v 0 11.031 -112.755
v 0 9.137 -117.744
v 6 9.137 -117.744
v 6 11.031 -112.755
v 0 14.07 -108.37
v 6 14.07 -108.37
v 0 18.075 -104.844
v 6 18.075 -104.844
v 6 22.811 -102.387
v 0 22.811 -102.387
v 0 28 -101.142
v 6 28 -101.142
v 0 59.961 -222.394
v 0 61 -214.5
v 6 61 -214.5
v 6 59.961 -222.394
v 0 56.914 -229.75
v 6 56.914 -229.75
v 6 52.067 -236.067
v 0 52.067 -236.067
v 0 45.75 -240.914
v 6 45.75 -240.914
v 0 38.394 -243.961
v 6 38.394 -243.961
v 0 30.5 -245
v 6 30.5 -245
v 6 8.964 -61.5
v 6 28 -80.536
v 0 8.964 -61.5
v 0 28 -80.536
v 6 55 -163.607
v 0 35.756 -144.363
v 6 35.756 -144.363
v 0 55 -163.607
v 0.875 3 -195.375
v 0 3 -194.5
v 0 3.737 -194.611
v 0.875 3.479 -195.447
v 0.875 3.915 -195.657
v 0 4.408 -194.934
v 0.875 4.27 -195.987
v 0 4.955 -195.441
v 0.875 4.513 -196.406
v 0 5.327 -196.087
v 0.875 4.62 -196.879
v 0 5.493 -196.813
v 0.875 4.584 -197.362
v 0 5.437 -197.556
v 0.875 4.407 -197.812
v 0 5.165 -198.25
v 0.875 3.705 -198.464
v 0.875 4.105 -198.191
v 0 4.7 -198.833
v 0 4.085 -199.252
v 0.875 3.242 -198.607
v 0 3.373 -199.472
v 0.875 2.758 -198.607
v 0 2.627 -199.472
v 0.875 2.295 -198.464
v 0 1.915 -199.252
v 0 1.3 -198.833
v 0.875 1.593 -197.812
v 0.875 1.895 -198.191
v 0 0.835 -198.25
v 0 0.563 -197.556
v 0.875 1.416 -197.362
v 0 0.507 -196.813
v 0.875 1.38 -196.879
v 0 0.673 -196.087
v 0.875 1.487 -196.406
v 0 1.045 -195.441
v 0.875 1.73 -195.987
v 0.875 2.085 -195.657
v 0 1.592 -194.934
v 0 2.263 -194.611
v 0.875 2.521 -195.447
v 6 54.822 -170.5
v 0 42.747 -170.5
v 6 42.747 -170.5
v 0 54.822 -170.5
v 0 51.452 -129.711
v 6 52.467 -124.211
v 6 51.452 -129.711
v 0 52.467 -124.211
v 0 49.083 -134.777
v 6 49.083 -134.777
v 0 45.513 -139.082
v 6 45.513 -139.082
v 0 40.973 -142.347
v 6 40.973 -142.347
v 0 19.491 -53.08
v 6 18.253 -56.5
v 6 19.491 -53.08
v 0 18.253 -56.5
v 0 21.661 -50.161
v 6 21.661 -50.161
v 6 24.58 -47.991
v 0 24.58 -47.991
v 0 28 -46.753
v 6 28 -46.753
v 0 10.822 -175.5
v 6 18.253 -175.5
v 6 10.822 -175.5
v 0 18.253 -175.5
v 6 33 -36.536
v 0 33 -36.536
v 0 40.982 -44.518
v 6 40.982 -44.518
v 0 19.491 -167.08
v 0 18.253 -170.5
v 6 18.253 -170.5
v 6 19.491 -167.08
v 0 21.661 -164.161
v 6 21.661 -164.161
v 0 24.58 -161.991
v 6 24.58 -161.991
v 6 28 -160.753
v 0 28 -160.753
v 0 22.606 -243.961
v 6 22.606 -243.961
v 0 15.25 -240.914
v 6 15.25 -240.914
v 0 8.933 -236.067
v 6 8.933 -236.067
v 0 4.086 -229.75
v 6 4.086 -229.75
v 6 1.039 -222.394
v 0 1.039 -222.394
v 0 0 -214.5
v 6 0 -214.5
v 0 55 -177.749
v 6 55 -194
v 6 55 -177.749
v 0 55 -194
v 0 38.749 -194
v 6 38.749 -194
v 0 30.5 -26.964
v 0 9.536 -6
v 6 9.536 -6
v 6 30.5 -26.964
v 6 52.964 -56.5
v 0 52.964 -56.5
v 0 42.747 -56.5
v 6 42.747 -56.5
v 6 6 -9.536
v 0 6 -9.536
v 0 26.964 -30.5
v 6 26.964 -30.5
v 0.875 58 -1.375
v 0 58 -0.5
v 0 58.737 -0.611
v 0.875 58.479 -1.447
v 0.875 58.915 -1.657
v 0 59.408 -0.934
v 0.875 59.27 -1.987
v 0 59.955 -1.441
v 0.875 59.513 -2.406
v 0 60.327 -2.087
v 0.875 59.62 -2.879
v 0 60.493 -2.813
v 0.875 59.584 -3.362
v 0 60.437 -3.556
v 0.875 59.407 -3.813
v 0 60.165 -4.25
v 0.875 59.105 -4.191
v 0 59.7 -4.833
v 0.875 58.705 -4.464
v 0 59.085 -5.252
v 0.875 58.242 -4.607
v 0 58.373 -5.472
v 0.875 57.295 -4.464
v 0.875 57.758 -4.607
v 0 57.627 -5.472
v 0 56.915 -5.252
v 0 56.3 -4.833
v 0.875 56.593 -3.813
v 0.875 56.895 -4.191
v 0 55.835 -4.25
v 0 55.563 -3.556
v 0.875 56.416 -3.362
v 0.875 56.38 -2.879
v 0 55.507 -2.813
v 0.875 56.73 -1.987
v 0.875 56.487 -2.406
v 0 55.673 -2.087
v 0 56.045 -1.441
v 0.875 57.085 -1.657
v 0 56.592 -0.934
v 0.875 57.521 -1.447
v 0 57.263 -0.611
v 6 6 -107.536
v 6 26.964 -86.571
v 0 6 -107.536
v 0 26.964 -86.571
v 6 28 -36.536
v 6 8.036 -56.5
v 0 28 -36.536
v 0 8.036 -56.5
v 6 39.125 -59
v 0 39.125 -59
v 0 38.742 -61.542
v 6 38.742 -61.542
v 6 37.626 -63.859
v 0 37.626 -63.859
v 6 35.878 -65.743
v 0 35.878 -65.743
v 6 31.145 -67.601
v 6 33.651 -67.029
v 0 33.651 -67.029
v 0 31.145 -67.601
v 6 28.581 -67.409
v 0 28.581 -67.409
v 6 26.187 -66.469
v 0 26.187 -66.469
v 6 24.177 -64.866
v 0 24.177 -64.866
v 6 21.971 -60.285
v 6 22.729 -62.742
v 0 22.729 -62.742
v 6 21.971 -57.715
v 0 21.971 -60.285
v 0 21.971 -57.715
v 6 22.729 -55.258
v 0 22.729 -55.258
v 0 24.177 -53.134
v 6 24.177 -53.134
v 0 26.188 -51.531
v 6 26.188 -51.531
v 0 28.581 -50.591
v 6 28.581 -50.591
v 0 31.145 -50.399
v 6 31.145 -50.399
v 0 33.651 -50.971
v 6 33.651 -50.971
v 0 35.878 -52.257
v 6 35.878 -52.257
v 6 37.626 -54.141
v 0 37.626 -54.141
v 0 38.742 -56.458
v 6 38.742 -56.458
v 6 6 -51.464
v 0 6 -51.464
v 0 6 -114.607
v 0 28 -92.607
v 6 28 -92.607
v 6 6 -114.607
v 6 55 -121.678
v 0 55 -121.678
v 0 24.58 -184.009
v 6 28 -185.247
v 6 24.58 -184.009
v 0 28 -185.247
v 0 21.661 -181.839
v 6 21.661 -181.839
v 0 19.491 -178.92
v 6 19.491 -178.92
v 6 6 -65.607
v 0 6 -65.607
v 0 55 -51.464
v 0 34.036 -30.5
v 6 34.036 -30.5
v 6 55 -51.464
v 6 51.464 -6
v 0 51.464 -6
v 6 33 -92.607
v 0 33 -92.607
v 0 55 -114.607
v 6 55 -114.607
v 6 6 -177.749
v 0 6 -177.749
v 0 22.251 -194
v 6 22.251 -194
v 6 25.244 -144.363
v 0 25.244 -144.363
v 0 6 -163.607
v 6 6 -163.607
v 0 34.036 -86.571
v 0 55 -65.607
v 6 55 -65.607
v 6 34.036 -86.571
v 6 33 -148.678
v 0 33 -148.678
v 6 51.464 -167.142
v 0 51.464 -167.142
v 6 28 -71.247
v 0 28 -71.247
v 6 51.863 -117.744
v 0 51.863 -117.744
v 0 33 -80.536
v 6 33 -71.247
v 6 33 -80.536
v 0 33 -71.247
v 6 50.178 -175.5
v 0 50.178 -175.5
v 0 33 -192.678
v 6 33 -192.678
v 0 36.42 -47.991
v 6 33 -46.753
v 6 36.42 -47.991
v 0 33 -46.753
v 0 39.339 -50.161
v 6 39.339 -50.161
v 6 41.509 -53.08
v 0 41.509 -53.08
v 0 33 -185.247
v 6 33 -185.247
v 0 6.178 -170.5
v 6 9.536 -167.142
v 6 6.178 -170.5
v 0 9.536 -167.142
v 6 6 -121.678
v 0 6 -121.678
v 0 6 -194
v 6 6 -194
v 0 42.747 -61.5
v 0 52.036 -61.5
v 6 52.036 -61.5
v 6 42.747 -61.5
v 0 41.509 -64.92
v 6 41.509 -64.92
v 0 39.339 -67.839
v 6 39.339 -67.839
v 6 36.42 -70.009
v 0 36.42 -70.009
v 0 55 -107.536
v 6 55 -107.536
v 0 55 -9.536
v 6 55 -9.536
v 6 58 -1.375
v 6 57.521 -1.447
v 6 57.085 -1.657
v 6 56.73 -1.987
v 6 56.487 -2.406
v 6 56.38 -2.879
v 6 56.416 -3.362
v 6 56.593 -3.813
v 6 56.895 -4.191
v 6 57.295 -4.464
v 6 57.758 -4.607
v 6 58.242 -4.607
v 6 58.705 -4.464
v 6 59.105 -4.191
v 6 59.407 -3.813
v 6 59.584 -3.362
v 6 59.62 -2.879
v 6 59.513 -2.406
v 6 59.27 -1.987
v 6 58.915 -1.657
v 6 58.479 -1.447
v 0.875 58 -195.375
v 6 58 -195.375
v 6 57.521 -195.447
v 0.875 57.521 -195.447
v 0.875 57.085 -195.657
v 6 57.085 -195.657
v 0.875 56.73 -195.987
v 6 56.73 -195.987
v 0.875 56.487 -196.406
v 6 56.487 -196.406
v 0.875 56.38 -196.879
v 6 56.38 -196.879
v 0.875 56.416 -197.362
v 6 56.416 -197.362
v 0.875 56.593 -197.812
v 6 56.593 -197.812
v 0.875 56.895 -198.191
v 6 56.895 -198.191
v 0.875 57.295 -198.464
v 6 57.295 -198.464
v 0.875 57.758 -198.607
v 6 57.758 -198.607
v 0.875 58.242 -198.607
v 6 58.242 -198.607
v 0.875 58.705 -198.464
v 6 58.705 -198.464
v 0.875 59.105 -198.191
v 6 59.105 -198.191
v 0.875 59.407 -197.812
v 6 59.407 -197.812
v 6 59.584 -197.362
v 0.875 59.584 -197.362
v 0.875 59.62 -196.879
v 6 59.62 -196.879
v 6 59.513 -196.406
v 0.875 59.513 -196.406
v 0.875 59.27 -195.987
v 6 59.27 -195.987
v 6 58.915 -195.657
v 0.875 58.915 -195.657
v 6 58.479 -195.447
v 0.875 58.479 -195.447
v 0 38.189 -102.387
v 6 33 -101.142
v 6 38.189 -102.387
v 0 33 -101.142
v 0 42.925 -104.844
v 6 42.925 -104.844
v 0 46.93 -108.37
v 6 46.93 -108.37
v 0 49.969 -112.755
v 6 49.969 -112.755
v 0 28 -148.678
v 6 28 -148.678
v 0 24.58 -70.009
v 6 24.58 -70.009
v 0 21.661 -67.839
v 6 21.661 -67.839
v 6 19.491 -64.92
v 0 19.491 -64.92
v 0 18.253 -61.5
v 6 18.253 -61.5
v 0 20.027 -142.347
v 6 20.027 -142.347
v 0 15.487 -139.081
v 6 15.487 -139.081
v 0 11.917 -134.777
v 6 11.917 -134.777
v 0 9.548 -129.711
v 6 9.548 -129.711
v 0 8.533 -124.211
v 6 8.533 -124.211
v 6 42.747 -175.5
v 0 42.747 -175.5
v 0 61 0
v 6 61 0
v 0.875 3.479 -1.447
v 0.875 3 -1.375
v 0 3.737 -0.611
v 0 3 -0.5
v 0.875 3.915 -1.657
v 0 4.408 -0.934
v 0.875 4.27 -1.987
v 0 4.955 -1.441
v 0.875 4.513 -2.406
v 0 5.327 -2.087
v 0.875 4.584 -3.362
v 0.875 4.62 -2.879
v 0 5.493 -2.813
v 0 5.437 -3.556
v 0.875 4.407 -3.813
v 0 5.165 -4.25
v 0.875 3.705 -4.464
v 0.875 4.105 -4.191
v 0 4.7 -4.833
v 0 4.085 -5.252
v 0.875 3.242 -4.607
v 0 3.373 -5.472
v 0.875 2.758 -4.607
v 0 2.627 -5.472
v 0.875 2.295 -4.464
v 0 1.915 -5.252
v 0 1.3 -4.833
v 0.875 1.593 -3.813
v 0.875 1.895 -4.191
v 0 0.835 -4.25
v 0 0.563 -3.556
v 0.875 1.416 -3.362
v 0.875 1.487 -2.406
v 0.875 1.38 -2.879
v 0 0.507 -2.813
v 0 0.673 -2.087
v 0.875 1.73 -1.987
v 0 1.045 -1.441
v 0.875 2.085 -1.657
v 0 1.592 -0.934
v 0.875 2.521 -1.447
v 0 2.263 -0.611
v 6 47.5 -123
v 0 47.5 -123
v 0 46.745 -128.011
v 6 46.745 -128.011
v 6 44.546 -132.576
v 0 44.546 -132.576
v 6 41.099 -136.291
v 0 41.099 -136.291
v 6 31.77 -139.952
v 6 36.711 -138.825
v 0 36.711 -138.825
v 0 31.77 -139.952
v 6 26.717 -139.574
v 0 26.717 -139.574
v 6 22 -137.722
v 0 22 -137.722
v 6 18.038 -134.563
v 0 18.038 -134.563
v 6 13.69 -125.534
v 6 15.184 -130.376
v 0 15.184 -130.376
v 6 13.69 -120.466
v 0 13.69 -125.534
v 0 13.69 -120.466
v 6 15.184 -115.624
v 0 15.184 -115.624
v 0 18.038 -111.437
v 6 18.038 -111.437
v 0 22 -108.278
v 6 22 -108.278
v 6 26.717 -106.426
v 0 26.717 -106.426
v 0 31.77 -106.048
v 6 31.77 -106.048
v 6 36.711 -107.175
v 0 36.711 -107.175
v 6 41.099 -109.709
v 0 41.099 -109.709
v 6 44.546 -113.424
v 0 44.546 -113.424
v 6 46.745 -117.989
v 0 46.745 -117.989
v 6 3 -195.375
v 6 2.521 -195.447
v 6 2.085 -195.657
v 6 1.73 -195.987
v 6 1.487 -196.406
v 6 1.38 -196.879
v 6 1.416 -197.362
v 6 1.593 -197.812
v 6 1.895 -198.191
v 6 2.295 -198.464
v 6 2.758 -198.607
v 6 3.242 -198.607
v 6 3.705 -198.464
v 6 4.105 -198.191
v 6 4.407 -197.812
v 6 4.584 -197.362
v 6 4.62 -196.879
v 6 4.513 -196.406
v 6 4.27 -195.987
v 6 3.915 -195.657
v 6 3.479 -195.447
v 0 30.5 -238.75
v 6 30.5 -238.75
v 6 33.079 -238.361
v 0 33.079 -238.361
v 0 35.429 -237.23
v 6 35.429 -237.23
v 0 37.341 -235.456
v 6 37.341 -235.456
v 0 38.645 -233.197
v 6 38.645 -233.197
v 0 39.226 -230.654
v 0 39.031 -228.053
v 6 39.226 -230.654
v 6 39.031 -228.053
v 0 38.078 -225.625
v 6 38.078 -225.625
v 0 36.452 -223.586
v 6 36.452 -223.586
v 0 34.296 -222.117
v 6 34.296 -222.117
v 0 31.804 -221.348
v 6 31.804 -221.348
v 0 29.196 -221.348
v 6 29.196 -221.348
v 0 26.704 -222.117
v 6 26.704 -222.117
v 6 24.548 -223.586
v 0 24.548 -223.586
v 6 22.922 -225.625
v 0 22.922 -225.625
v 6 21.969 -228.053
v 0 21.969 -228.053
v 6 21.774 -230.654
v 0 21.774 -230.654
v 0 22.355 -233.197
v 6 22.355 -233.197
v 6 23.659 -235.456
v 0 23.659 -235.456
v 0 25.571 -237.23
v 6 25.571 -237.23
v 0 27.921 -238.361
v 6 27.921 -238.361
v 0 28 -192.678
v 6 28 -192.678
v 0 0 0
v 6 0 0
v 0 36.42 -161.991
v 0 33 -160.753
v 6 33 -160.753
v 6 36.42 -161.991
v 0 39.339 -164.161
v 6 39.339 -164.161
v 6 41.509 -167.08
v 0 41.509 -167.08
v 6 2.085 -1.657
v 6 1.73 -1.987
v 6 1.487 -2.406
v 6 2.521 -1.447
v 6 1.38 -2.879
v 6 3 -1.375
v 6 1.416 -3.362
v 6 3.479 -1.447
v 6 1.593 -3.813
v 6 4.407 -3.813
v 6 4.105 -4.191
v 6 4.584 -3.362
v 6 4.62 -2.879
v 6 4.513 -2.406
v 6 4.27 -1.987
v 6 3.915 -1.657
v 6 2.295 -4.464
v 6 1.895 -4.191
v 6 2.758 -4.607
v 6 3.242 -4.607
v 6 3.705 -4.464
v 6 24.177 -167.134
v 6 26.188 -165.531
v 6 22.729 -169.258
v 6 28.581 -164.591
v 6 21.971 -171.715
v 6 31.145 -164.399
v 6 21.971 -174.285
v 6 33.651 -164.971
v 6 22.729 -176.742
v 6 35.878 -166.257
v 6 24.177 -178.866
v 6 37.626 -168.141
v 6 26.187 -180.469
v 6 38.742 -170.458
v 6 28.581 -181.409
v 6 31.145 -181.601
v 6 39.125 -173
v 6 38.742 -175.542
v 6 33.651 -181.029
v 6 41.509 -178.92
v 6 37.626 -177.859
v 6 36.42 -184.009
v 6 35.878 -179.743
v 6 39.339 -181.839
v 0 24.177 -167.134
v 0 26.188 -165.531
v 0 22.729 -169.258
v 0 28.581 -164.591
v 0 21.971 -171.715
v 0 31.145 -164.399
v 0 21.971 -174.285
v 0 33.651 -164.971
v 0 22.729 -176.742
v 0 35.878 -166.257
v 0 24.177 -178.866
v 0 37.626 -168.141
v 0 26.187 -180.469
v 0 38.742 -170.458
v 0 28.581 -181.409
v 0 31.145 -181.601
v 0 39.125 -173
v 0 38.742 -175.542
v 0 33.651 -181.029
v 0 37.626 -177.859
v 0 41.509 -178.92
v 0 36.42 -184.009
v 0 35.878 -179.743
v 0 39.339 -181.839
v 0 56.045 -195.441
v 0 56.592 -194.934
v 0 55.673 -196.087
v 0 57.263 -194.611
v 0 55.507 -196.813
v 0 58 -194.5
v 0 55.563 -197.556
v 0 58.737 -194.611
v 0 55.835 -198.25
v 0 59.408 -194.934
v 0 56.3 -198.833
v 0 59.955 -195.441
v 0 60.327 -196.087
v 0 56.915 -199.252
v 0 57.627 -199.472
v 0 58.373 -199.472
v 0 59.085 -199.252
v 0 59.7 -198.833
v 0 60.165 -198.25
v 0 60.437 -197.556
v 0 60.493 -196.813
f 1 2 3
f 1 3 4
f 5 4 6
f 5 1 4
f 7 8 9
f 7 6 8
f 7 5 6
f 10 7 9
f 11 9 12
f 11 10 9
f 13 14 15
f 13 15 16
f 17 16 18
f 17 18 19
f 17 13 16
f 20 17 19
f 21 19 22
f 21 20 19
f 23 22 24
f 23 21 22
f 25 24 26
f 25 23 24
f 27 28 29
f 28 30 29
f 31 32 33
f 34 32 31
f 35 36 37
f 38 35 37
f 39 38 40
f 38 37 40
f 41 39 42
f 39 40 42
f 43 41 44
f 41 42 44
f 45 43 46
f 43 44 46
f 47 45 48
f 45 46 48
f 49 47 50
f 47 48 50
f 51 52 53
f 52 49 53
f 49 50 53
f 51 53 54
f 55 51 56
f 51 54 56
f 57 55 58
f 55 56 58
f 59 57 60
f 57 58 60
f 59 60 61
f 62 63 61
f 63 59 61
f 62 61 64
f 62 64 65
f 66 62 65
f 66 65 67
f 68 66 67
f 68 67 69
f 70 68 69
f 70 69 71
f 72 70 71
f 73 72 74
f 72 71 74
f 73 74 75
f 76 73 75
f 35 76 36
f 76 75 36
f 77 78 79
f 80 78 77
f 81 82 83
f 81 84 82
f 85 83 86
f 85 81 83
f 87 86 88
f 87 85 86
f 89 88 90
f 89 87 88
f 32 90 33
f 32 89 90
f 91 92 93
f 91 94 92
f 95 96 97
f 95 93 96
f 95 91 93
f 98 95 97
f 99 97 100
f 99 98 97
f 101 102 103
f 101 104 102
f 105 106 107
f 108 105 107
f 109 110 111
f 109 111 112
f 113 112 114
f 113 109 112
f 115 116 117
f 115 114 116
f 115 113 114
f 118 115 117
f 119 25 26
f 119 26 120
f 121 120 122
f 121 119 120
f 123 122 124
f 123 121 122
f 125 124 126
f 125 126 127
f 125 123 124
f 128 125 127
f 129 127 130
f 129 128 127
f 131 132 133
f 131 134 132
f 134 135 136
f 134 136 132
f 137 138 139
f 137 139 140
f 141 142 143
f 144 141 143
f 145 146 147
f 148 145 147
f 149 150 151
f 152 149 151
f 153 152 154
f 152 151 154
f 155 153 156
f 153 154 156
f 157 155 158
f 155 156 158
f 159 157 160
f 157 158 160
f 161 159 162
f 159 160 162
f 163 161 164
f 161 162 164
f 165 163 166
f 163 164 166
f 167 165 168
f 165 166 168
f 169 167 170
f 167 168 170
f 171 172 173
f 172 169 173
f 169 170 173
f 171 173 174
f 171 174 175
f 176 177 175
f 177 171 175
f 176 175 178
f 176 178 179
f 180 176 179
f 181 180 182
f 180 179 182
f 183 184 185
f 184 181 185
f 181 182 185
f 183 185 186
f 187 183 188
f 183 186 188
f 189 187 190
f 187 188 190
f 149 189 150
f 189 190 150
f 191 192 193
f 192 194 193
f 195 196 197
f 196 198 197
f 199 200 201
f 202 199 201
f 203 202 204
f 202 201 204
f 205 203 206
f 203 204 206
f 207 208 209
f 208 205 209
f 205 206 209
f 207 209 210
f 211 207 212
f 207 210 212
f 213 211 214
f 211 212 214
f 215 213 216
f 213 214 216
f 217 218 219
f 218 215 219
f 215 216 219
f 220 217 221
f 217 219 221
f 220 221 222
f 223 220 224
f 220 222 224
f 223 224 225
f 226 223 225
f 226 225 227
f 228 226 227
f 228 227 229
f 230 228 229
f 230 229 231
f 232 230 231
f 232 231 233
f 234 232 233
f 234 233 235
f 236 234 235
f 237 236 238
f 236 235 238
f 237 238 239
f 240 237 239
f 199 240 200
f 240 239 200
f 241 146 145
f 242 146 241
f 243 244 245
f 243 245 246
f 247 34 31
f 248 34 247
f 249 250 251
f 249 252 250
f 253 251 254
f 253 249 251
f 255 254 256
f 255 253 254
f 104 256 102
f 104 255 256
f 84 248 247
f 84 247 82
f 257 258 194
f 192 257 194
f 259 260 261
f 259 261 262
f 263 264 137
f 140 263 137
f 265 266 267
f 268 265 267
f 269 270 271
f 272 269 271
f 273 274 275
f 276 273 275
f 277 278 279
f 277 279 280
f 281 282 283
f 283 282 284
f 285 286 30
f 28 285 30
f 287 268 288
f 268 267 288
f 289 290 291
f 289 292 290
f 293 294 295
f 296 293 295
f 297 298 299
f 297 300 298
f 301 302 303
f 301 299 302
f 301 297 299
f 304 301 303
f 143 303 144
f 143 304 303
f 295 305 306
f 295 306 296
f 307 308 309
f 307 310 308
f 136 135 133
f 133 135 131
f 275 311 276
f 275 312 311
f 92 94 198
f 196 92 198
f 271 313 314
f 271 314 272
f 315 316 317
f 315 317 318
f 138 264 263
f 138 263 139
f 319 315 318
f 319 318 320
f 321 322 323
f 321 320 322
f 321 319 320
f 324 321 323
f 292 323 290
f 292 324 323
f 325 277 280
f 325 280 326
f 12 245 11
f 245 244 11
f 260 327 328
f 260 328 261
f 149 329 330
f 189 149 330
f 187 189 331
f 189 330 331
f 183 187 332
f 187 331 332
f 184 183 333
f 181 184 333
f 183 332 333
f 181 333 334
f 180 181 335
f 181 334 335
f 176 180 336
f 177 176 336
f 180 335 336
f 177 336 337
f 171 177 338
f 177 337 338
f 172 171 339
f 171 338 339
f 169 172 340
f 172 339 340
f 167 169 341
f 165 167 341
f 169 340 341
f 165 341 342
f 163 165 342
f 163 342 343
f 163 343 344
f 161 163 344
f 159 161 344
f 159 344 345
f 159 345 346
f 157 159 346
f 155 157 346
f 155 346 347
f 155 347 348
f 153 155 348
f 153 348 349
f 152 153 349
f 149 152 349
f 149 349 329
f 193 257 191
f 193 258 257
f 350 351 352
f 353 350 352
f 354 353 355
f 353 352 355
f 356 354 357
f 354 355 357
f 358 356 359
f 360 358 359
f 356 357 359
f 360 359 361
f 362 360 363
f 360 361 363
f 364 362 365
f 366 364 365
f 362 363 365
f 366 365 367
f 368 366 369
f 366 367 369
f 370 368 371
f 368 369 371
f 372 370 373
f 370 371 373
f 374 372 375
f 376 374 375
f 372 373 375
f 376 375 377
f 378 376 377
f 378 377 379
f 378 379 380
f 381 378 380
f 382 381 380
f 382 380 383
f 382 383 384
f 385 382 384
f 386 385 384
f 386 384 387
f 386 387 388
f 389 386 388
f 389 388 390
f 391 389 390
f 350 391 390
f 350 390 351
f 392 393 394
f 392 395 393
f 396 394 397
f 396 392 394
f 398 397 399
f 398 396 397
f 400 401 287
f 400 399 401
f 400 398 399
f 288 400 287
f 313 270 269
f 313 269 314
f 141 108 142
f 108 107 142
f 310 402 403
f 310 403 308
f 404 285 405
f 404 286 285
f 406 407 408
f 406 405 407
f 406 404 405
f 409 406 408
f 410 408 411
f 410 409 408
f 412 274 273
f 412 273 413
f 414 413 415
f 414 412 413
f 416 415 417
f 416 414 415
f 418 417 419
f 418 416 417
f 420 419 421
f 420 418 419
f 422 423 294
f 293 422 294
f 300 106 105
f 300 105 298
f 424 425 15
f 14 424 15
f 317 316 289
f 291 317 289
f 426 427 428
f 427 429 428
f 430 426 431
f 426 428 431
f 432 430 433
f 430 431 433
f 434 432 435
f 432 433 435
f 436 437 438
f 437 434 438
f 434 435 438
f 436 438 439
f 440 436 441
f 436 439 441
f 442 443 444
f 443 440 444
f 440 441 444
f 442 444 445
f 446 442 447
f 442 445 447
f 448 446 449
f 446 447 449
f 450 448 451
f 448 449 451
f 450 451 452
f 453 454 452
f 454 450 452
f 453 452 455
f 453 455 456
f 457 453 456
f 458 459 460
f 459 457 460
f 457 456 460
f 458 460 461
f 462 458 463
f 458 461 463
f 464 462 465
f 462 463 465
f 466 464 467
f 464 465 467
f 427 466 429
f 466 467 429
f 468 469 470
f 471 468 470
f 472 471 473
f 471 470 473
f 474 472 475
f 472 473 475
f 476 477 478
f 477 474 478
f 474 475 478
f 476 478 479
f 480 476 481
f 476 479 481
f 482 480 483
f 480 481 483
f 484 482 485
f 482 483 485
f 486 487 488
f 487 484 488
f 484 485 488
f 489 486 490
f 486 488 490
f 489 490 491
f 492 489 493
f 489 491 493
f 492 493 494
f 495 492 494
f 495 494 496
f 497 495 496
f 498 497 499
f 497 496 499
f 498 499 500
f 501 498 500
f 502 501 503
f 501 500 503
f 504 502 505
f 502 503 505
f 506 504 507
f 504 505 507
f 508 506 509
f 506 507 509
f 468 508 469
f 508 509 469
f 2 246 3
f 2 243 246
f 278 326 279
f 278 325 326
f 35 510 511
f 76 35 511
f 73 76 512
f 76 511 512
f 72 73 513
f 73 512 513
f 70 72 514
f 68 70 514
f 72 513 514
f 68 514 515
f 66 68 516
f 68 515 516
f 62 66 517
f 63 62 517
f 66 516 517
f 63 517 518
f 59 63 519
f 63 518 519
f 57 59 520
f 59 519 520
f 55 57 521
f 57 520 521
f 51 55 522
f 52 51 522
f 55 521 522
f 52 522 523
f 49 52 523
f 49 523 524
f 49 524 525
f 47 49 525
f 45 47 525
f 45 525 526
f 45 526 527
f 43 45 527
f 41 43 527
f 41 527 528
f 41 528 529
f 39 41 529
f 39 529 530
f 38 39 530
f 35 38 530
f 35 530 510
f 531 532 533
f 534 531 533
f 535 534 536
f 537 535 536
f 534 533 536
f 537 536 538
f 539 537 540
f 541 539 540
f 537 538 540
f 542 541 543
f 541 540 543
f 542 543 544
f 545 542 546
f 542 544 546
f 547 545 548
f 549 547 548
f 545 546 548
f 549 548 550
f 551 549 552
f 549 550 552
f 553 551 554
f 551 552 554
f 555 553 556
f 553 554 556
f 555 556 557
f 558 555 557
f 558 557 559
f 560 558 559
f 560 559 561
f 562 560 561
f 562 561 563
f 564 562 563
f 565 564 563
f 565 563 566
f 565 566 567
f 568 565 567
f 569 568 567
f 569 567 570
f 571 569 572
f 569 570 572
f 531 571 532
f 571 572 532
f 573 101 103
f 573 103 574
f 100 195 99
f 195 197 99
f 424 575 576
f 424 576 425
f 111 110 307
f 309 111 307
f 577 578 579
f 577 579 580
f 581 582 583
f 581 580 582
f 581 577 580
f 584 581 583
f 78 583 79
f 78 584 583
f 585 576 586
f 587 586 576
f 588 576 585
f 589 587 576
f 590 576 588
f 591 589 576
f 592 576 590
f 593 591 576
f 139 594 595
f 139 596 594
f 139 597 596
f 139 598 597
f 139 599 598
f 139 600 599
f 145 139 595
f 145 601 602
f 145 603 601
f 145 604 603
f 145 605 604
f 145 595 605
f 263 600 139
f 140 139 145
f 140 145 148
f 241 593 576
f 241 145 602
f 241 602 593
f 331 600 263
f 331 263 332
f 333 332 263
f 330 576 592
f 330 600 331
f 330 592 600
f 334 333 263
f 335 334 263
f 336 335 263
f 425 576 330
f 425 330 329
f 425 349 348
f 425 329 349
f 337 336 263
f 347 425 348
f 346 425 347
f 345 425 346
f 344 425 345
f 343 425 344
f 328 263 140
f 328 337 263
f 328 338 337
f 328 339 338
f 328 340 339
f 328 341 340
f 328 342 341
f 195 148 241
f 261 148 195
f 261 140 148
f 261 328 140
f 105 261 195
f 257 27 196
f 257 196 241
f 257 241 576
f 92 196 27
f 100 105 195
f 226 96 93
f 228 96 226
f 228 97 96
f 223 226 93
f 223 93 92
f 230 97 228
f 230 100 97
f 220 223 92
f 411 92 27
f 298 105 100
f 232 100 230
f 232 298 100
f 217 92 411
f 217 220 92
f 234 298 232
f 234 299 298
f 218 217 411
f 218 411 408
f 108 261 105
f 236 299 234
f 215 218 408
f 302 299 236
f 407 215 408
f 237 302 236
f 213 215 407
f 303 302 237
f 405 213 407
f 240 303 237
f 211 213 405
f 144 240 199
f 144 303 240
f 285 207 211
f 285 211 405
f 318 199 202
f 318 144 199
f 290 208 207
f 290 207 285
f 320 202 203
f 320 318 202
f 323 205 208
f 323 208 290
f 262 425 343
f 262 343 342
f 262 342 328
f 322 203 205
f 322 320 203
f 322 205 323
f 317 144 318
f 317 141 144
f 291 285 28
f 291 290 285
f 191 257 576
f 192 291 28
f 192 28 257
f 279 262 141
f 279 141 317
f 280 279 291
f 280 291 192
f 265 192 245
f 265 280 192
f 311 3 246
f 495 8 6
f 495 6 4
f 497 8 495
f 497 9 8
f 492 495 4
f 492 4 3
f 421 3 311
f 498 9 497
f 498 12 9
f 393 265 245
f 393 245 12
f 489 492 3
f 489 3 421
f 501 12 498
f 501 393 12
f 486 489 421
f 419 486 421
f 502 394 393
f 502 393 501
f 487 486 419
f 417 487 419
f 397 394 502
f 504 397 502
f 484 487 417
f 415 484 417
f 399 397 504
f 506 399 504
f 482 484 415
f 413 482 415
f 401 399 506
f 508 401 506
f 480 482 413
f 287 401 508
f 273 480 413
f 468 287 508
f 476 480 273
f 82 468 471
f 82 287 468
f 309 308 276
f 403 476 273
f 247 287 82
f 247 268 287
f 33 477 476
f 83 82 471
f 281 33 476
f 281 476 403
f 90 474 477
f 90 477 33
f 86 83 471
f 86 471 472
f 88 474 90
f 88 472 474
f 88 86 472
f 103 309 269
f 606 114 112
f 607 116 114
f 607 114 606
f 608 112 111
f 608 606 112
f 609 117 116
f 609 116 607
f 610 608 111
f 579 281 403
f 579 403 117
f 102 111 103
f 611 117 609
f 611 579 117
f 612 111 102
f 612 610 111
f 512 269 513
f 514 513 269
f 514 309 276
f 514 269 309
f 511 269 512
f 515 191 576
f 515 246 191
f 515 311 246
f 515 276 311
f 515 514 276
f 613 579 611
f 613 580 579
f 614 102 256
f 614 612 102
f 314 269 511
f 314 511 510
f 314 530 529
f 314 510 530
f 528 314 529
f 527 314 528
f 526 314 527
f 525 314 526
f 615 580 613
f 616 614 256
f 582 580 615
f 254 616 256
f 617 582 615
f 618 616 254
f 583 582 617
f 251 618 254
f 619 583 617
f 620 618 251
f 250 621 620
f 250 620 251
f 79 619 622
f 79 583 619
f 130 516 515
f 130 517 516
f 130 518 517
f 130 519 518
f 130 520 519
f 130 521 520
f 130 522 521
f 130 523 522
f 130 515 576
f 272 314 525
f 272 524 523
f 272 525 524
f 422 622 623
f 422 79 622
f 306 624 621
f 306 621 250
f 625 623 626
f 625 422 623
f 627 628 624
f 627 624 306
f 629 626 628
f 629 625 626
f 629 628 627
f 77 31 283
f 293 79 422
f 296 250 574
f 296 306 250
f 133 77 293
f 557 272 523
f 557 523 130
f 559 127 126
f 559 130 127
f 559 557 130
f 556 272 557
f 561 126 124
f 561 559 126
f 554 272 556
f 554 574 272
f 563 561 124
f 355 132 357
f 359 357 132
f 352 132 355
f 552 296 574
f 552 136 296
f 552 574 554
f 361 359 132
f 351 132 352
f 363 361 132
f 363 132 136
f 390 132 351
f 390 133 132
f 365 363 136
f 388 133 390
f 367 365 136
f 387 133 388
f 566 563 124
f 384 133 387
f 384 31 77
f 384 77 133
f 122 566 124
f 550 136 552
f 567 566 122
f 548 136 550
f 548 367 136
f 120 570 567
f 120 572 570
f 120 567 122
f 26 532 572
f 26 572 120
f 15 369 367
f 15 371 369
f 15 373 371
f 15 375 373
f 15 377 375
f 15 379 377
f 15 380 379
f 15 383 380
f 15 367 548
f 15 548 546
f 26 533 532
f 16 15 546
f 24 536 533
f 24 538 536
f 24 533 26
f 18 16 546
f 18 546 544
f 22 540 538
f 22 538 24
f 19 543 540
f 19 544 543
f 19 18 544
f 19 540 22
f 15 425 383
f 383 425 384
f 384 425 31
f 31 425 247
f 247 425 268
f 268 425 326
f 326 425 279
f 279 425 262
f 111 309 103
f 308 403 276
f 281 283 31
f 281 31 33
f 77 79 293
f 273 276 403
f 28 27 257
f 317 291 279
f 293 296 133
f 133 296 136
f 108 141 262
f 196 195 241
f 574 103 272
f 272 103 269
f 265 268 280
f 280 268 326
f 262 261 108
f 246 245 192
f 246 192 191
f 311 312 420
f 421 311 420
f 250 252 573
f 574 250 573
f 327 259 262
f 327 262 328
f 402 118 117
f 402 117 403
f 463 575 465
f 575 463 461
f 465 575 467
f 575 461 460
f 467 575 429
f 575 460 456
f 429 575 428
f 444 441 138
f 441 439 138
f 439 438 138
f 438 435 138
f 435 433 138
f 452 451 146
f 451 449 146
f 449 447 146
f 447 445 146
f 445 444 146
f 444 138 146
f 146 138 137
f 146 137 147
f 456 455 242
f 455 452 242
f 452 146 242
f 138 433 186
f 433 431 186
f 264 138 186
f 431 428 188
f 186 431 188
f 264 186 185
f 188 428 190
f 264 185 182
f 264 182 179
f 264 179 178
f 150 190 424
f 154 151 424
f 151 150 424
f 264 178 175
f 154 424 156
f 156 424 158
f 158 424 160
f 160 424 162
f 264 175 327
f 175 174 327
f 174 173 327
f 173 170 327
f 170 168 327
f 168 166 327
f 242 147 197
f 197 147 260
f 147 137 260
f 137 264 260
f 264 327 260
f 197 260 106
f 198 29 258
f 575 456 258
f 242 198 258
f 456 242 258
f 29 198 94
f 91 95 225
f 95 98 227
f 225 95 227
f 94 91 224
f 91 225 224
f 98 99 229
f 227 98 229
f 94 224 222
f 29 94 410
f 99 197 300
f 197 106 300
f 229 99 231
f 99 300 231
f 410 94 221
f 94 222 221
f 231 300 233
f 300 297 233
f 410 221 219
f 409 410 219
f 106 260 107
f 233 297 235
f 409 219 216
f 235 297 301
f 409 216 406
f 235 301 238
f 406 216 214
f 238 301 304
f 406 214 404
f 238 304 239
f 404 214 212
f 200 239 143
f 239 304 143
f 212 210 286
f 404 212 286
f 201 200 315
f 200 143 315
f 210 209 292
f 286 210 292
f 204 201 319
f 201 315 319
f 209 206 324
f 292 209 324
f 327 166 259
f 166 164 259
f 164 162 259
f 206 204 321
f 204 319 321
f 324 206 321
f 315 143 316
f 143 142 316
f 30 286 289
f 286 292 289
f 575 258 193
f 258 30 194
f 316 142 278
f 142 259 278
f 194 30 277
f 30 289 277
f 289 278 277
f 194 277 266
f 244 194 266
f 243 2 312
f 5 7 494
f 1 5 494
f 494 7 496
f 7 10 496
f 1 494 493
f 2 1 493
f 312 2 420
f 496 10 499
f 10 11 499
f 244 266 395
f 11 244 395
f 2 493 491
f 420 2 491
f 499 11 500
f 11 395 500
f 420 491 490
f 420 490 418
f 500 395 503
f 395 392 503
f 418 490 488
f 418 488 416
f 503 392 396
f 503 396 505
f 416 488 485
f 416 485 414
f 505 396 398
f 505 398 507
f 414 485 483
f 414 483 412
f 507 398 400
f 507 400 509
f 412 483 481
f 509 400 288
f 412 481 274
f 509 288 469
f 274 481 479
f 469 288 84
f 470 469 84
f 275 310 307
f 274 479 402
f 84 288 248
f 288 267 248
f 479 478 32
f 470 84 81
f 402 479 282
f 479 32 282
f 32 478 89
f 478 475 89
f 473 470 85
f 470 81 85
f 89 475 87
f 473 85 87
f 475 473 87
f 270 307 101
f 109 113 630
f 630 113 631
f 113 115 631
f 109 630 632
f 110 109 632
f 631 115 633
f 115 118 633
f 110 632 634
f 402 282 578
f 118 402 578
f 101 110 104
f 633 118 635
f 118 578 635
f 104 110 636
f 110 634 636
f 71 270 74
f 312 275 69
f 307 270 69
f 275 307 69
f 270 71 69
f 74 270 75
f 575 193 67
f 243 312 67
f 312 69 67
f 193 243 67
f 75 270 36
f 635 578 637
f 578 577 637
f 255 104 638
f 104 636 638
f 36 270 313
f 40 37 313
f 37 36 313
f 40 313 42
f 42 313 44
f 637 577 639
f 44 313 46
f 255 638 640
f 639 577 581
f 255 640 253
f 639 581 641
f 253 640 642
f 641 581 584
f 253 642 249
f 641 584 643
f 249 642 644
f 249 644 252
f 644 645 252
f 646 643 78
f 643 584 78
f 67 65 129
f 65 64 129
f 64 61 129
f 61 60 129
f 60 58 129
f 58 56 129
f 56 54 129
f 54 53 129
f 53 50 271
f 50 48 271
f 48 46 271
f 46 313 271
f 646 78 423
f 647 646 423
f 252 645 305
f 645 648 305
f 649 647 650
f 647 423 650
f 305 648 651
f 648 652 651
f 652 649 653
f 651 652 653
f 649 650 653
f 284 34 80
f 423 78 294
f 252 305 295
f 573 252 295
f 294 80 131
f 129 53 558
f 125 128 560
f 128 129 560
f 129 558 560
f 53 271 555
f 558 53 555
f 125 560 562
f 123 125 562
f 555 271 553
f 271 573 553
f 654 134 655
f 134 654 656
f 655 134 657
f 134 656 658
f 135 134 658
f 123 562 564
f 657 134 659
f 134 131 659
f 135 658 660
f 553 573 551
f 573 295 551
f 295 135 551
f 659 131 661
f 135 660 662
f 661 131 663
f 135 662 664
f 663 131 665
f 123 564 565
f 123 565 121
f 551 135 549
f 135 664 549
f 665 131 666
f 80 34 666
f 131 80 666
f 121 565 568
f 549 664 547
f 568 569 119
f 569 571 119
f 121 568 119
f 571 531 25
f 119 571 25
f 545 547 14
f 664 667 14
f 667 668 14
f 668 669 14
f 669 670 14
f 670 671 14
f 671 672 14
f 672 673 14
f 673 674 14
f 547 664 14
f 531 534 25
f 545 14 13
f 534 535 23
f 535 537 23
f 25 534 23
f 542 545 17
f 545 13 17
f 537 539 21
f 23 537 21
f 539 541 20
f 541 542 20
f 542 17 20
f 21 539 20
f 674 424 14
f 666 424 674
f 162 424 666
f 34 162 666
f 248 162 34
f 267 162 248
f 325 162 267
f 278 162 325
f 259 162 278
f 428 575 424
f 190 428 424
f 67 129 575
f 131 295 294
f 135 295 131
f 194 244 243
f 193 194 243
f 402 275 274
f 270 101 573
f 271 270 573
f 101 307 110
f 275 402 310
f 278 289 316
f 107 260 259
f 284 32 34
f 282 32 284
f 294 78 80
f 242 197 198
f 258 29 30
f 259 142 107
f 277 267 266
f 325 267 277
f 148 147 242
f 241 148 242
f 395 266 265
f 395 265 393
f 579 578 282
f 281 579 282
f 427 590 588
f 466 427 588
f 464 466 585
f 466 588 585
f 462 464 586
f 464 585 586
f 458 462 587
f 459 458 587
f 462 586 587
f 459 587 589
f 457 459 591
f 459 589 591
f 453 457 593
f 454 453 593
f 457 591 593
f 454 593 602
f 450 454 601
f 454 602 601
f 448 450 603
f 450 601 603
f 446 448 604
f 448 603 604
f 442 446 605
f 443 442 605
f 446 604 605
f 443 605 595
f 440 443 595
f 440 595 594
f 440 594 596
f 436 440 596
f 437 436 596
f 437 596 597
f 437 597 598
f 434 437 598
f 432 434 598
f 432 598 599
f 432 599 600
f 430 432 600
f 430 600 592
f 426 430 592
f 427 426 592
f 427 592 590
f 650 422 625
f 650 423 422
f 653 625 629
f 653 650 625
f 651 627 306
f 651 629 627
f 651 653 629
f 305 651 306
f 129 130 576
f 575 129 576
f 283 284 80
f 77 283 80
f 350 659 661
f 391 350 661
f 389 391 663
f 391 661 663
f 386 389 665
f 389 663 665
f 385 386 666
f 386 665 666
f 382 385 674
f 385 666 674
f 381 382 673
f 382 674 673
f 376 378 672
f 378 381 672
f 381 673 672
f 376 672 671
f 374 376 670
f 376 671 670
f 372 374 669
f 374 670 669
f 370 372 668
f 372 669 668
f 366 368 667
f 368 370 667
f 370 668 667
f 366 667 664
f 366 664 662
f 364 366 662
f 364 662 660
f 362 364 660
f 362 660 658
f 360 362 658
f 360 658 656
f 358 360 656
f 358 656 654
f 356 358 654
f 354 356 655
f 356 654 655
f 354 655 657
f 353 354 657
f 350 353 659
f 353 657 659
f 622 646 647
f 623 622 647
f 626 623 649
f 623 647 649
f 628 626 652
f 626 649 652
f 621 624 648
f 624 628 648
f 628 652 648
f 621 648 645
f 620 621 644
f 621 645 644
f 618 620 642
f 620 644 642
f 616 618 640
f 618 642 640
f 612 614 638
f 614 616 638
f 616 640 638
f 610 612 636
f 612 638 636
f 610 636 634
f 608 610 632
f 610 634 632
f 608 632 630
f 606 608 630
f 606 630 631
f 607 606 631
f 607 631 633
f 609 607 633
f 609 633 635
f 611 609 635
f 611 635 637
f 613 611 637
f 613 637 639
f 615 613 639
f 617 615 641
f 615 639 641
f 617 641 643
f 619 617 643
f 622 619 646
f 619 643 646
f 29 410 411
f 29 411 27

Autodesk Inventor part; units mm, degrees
ref_plane "YZ Plane" through (0, 0, 0) normal (1, 0, 0) x (0, 1, 0)
ref_plane "XZ Plane" through (0, 0, 0) normal (0, 1, 0) x (-1, 0, 0)
ref_plane "XY Plane" through (0, 0, 0) normal (0, 0, 1) x (1, 0, 0)
sketch "Sketch1" plane through (0, 0, 0) normal (1, 0, 0) x (0, 1, 0)
  line L0 (0, 0) -> (61, 0)
  line L1 (61, 0) -> (61, -200)
  line L2 (61, -200) -> (0, -200)
  line L3 (0, -200) -> (0, 0)
  line L4 (51.4645, -6) -> (9.5355, -6)
  circle A0 centre (30.5, -173) radius 8.625
  circle A1 centre (30.5, -123) radius 17
  circle A2 centre (30.5, -59) radius 8.625
  line L5 (55, -51.4645) -> (55, -9.5355)
  line L6 (55, -9.5355) -> (34.0355, -30.5)
  line L7 (6, -9.5355) -> (26.9645, -30.5)
  line L8 (51.4645, -6) -> (30.5, -26.9645)
  line L9 (26.9645, -30.5) -> (6, -51.4645)
  line L10 (9.5355, -6) -> (30.5, -26.9645)
  line L11 (34.0355, -30.5) -> (55, -51.4645)
  line L12 (6, -9.5355) -> (6, -51.4645)
  line L13 (51.4645, -111.0711) -> (55, -114.6066)
  line L14 (9.5355, -111.0711) -> (6, -114.6066)
  line L15 (55, -107.5355) -> (55, -65.6066)
  line L16 (26.9645, -86.5711) -> (6, -107.5355)
  line L17 (34.0355, -86.5711) -> (55, -107.5355)
  line L18 (55, -65.6066) -> (34.0355, -86.5711)
  line L19 (28, -92.6066) -> (9.5355, -111.0711)
  line L20 (6, -65.6066) -> (26.9645, -86.5711)
  line L21 (33, -92.6066) -> (51.4645, -111.0711)
  line L22 (6, -65.6066) -> (6, -107.5355)
  line L23 (40.9822, -44.5178) -> (52.9645, -56.5)
  line L24 (52.0355, -61.5) -> (33, -80.5355)
  line L25 (28, -80.5355) -> (8.9645, -61.5)
  line L26 (8.0355, -56.5) -> (28, -36.5355)
  line L27 (33, -36.5355) -> (40.9822, -44.5178)
  line L28 (33, -36.5355) -> (33, -46.7526)
  line L29 (33, -71.2474) -> (33, -80.5355)
  line L30 (28, -36.5355) -> (28, -46.7526)
  line L31 (28, -71.2474) -> (28, -80.5355)
  line L32 (18.2526, -61.5) -> (8.9645, -61.5)
  line L33 (18.2526, -56.5) -> (8.0355, -56.5)
  arc A3 (28, -46.7526) -> (18.2526, -56.5) centre (30.5, -59) ccw
  arc A4 (18.2526, -61.5) -> (28, -71.2474) centre (30.5, -59) ccw
  arc A5 (33, -71.2474) -> (42.7474, -61.5) centre (30.5, -59) ccw
  arc A6 (42.7474, -56.5) -> (33, -46.7526) centre (30.5, -59) ccw
  line L34 (52.0355, -61.5) -> (42.7474, -61.5)
  line L35 (52.9645, -56.5) -> (42.7474, -56.5)
  line L36 (10.8223, -175.5) -> (28, -192.6777)
  line L37 (50.1777, -175.5) -> (33, -192.6777)
  line L38 (38.7487, -194) -> (55, -177.7487)
  line L39 (6, -177.7487) -> (22.2513, -194)
  line L40 (9.5355, -167.1421) -> (6.1777, -170.5)
  line L41 (51.4645, -167.1421) -> (54.8223, -170.5)
  line L42 (55, -194) -> (55, -177.7487)
  line L43 (55, -163.6066) -> (55, -121.6777)
  line L44 (6, -194) -> (22.2513, -194)
  line L45 (38.7487, -194) -> (55, -194)
  line L46 (6, -121.6777) -> (6, -163.6066)
  line L47 (6, -177.7487) -> (6, -194)
  line L48 (6, -114.6066) -> (9.1371, -117.7437)
  line L49 (6, -121.6777) -> (8.5334, -124.211)
  line L50 (35.7563, -144.3629) -> (55, -163.6066)
  line L51 (55, -114.6066) -> (51.8629, -117.7437)
  line L52 (25.2437, -144.3629) -> (6, -163.6066)
  line L53 (55, -121.6777) -> (52.4666, -124.211)
  line L54 (28, -148.6777) -> (9.5355, -167.1421)
  line L55 (33, -148.6777) -> (51.4645, -167.1421)
  arc A7 (8.5334, -124.211) -> (25.2437, -144.3629) centre (30.5, -123) ccw
  arc A8 (35.7563, -144.3629) -> (52.4666, -124.211) centre (30.5, -123) ccw
  line L56 (33, -160.7526) -> (33, -148.6777)
  line L57 (33, -185.2474) -> (33, -192.6777)
  line L58 (28, -185.2474) -> (28, -192.6777)
  line L59 (42.7474, -175.5) -> (50.1777, -175.5)
  line L60 (42.7474, -170.5) -> (54.8223, -170.5)
  line L61 (18.2526, -170.5) -> (6.1777, -170.5)
  line L62 (28, -160.7526) -> (28, -148.6777)
  line L63 (18.2526, -175.5) -> (10.8223, -175.5)
  arc A9 (18.2526, -175.5) -> (28, -185.2474) centre (30.5, -173) ccw
  arc A10 (33, -185.2474) -> (42.7474, -175.5) centre (30.5, -173) ccw
  arc A11 (42.7474, -170.5) -> (33, -160.7526) centre (30.5, -173) ccw
  arc A12 (28, -160.7526) -> (18.2526, -170.5) centre (30.5, -173) ccw
  line L64 (33, -92.6066) -> (33, -101.1425)
  line L65 (28, -92.6066) -> (28, -101.1425)
  arc A13 (51.8629, -117.7437) -> (33, -101.1425) centre (30.5, -123) ccw
  arc A14 (28, -101.1425) -> (9.1371, -117.7437) centre (30.5, -123) ccw
  dimension "d0" = 61
  dimension "d1" = 200
  dimension "d49" = 17.25
  dimension "d50" = 34
  dimension "d51" = 17.25
extrude "Extrusion1" add sketch "Sketch1" along normal blind 6
sketch "Sketch2" plane through (0, 0, 0) normal (-1, 0, 0) x (0, 0, 1)
  line L0 (0, 0) -> (-200, 0) projected
  line L1 (-200, 61) -> (0, 61) projected
  line L2 (-200, 0) -> (-200, 61) projected
  line L3 (0, 61) -> (0, 0) projected
  point P0 (-197, 58)
  point P1 (-197, 3)
  point P2 (-3, 58)
  point P3 (-3, 3)
hole "Hole1" at (0, 58, -3) at (0, 58, -197) at (0, 3, -197) at (0, 3, -3) direction (1, 0, 0) diameter 3.25 depth 6 countersink diameter 5 countersink angle 90
sketch "Sketch3" plane through (6, 0, 0) normal (1, 0, 0) x (0, 0, -1)
  circle A0 centre (173, 30.5) radius 8.625 projected
  circle A1 centre (230, 30.5) radius 2.75
  circle A2 centre (230, 30.5) radius 8.75
  line L0 (200, 0) -> (200, 61) projected
  line L1 (245, 30.5) -> (245, 61)
  line L2 (200, 0) -> (200, 61)
  line L3 (200, 61) -> (245, 61)
  line L4 (245, 30.5) -> (245, 0)
  line L5 (245, 0) -> (200, 0)
  point P0 (0, 0)
  dimension "d53" = 5.5
  dimension "d54" = 17.5
  dimension "d55" = 15
extrude "Extrusion2" add sketch "Sketch3" against normal blind 6 contours L0 L3 L1 L4 L5
fillet "Fillet1" radius 30.5 2 edges at (3, 61, -245) (3, 0, -245)
properties part number "Side_Piece"
